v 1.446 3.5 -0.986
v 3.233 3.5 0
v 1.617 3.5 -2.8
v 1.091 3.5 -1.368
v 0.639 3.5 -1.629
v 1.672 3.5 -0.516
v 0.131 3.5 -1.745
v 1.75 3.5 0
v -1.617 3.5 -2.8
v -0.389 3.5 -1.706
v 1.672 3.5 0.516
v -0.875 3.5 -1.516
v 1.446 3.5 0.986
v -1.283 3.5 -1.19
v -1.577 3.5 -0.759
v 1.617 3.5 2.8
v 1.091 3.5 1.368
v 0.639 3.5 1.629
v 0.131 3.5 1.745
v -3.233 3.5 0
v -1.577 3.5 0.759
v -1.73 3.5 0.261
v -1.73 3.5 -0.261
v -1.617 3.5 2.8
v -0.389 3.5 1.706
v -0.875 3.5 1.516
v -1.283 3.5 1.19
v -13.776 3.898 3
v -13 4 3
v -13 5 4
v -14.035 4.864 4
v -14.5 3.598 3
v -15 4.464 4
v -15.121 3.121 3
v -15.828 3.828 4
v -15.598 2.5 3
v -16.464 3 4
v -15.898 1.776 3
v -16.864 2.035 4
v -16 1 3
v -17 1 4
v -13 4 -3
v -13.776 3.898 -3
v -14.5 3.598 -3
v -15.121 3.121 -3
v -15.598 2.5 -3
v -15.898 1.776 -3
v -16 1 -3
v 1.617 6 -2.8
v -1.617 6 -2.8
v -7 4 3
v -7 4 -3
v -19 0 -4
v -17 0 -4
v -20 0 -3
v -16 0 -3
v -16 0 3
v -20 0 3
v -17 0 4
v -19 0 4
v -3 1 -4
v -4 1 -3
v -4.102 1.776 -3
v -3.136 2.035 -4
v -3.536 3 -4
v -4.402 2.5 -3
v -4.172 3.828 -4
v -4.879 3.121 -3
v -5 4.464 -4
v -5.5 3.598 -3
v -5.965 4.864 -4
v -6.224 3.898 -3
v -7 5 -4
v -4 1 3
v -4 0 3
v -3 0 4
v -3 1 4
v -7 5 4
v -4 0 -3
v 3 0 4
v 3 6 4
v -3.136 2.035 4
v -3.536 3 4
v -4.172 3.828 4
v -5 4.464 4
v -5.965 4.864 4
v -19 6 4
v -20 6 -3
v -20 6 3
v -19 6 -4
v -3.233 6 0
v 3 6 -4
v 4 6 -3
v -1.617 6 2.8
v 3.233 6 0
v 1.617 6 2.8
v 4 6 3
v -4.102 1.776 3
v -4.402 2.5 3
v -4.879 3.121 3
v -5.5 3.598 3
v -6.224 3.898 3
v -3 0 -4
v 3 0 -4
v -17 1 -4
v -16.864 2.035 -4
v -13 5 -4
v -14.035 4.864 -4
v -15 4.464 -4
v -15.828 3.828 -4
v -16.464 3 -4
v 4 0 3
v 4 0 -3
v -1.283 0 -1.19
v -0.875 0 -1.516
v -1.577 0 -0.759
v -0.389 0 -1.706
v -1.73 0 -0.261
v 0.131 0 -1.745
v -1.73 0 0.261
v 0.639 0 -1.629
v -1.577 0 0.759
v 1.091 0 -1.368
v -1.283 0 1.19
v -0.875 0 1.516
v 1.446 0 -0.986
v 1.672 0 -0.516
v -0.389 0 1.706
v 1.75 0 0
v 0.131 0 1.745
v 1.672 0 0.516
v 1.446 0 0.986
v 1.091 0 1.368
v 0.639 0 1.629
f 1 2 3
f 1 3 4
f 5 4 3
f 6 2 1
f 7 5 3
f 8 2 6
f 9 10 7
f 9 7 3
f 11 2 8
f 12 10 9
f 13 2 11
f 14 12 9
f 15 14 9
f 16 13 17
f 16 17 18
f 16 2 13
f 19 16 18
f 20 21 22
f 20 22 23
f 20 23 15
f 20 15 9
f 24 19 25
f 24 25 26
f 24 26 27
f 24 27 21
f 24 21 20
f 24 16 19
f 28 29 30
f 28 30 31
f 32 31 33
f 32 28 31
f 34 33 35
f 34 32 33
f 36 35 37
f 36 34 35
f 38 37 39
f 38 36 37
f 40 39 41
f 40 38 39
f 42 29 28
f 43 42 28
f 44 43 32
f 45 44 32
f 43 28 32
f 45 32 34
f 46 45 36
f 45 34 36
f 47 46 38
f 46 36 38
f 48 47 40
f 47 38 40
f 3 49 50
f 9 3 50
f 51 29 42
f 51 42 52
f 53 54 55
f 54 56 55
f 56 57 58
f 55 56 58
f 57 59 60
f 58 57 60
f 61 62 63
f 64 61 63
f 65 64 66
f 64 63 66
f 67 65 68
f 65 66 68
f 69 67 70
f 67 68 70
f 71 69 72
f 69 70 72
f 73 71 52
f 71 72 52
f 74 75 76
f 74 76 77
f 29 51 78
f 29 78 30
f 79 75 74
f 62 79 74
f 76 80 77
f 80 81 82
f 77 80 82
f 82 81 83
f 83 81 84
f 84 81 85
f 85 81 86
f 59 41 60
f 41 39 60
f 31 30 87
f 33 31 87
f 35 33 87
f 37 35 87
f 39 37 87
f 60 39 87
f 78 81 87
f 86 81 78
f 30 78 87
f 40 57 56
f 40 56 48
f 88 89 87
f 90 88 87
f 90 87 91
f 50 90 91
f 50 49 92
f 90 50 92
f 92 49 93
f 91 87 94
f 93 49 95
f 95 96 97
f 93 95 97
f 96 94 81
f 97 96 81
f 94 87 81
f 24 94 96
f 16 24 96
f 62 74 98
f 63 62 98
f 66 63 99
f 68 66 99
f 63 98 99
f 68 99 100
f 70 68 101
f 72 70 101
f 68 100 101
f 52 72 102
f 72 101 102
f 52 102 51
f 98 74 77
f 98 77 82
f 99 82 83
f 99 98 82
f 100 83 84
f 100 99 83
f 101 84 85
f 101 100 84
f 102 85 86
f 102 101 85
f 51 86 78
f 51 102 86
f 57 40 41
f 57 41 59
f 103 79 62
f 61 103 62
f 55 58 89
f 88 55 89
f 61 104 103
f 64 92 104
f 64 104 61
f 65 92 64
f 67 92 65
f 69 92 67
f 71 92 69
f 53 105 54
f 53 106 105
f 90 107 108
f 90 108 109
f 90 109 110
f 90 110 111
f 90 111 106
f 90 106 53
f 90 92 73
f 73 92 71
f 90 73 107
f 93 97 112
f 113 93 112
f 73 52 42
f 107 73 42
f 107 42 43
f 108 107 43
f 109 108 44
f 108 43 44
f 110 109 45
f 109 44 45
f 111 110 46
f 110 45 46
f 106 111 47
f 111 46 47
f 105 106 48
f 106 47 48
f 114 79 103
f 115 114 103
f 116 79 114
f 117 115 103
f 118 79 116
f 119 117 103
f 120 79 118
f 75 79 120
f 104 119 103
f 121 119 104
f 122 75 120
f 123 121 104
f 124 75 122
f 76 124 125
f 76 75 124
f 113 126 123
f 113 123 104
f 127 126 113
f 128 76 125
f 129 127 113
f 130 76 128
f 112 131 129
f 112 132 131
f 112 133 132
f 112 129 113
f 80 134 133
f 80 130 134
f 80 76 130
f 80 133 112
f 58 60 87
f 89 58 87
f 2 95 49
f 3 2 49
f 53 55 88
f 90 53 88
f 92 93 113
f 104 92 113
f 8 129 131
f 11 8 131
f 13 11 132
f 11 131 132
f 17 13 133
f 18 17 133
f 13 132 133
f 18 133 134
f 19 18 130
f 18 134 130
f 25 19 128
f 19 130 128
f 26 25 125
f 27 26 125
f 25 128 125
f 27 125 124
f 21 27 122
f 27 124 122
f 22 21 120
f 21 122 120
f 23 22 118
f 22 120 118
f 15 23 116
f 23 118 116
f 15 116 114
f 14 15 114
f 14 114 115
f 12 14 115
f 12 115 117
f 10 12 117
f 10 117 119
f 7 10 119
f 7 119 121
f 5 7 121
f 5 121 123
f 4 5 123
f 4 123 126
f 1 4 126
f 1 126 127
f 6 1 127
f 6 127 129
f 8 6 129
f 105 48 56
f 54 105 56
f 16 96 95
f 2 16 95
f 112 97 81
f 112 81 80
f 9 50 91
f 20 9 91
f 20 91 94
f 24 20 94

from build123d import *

# Parameters (mm, degrees)
PAD_DEPTH       = 4
PAD_DEPTH_BACK  = 4
SKETCH001_R     = 1.75
POCKET_DEPTH    = 6.001
CHAMFER_SIZE    = 1
POCKET001_DEPTH = 2.5
CHAMFER001_SIZE = 1


with BuildPart() as part:
    # Sketch → Pad (new body, two sides)
    with BuildSketch(Plane.XY) as pad_sk:
        with BuildLine():
            Line((-16, 0), (-20, 0))
            Line((-20, 0), (-20, 6))
            Line((-20, 6), (4, 6))
            Line((4, 6), (4, 0))
            Line((-4, 0), (4, 0))
            Line((-4, 0), (-4, 1))
            ThreePointArc((-4, 1), (-4.87868, 3.12132), (-7, 4))
            Line((-13, 4), (-7, 4))
            ThreePointArc((-13, 4), (-15.12132, 3.12132), (-16, 1))
            Line((-16, 0), (-16, 1))
        make_face()
    extrude(amount=PAD_DEPTH)
    extrude(pad_sk.sketch, amount=-PAD_DEPTH_BACK)

    # Sketch001 → Pocket (cut, through all)
    with BuildSketch(Plane.XZ):
        Circle(SKETCH001_R)
    extrude(amount=-POCKET_DEPTH, mode=Mode.SUBTRACT)

    # Chamfer
    chamfer_edges = [part.edges().sort_by_distance(p)[0] for p in [
        (-20, 3, 4),
        (4, 3, 4),
        (4, 3, -4),
        (-20, 3, -4),
    ]]
    chamfer(chamfer_edges, length=CHAMFER_SIZE)

    # Sketch002 (on DatumPlane) → Pocket001 (cut)
    with BuildSketch(Plane(origin=(0, 6, 0), x_dir=(-1, 0, 0), z_dir=(0, 1, 0))):
        Polygon((3.233162, 0), (1.616581, 2.8), (-1.616581, 2.8), (-3.233162, 0), (-1.616581, -2.8), (1.616581, -2.8), align=None)
    extrude(amount=-POCKET001_DEPTH, mode=Mode.SUBTRACT)

    # Chamfer001
    chamfer001_edges = [part.edges().sort_by_distance(p)[0] for p in [
        (-4, 0.5, 4),
        (-4, 0.5, -4),
    ]]
    chamfer(chamfer001_edges, length=CHAMFER001_SIZE)


solid = part.part
